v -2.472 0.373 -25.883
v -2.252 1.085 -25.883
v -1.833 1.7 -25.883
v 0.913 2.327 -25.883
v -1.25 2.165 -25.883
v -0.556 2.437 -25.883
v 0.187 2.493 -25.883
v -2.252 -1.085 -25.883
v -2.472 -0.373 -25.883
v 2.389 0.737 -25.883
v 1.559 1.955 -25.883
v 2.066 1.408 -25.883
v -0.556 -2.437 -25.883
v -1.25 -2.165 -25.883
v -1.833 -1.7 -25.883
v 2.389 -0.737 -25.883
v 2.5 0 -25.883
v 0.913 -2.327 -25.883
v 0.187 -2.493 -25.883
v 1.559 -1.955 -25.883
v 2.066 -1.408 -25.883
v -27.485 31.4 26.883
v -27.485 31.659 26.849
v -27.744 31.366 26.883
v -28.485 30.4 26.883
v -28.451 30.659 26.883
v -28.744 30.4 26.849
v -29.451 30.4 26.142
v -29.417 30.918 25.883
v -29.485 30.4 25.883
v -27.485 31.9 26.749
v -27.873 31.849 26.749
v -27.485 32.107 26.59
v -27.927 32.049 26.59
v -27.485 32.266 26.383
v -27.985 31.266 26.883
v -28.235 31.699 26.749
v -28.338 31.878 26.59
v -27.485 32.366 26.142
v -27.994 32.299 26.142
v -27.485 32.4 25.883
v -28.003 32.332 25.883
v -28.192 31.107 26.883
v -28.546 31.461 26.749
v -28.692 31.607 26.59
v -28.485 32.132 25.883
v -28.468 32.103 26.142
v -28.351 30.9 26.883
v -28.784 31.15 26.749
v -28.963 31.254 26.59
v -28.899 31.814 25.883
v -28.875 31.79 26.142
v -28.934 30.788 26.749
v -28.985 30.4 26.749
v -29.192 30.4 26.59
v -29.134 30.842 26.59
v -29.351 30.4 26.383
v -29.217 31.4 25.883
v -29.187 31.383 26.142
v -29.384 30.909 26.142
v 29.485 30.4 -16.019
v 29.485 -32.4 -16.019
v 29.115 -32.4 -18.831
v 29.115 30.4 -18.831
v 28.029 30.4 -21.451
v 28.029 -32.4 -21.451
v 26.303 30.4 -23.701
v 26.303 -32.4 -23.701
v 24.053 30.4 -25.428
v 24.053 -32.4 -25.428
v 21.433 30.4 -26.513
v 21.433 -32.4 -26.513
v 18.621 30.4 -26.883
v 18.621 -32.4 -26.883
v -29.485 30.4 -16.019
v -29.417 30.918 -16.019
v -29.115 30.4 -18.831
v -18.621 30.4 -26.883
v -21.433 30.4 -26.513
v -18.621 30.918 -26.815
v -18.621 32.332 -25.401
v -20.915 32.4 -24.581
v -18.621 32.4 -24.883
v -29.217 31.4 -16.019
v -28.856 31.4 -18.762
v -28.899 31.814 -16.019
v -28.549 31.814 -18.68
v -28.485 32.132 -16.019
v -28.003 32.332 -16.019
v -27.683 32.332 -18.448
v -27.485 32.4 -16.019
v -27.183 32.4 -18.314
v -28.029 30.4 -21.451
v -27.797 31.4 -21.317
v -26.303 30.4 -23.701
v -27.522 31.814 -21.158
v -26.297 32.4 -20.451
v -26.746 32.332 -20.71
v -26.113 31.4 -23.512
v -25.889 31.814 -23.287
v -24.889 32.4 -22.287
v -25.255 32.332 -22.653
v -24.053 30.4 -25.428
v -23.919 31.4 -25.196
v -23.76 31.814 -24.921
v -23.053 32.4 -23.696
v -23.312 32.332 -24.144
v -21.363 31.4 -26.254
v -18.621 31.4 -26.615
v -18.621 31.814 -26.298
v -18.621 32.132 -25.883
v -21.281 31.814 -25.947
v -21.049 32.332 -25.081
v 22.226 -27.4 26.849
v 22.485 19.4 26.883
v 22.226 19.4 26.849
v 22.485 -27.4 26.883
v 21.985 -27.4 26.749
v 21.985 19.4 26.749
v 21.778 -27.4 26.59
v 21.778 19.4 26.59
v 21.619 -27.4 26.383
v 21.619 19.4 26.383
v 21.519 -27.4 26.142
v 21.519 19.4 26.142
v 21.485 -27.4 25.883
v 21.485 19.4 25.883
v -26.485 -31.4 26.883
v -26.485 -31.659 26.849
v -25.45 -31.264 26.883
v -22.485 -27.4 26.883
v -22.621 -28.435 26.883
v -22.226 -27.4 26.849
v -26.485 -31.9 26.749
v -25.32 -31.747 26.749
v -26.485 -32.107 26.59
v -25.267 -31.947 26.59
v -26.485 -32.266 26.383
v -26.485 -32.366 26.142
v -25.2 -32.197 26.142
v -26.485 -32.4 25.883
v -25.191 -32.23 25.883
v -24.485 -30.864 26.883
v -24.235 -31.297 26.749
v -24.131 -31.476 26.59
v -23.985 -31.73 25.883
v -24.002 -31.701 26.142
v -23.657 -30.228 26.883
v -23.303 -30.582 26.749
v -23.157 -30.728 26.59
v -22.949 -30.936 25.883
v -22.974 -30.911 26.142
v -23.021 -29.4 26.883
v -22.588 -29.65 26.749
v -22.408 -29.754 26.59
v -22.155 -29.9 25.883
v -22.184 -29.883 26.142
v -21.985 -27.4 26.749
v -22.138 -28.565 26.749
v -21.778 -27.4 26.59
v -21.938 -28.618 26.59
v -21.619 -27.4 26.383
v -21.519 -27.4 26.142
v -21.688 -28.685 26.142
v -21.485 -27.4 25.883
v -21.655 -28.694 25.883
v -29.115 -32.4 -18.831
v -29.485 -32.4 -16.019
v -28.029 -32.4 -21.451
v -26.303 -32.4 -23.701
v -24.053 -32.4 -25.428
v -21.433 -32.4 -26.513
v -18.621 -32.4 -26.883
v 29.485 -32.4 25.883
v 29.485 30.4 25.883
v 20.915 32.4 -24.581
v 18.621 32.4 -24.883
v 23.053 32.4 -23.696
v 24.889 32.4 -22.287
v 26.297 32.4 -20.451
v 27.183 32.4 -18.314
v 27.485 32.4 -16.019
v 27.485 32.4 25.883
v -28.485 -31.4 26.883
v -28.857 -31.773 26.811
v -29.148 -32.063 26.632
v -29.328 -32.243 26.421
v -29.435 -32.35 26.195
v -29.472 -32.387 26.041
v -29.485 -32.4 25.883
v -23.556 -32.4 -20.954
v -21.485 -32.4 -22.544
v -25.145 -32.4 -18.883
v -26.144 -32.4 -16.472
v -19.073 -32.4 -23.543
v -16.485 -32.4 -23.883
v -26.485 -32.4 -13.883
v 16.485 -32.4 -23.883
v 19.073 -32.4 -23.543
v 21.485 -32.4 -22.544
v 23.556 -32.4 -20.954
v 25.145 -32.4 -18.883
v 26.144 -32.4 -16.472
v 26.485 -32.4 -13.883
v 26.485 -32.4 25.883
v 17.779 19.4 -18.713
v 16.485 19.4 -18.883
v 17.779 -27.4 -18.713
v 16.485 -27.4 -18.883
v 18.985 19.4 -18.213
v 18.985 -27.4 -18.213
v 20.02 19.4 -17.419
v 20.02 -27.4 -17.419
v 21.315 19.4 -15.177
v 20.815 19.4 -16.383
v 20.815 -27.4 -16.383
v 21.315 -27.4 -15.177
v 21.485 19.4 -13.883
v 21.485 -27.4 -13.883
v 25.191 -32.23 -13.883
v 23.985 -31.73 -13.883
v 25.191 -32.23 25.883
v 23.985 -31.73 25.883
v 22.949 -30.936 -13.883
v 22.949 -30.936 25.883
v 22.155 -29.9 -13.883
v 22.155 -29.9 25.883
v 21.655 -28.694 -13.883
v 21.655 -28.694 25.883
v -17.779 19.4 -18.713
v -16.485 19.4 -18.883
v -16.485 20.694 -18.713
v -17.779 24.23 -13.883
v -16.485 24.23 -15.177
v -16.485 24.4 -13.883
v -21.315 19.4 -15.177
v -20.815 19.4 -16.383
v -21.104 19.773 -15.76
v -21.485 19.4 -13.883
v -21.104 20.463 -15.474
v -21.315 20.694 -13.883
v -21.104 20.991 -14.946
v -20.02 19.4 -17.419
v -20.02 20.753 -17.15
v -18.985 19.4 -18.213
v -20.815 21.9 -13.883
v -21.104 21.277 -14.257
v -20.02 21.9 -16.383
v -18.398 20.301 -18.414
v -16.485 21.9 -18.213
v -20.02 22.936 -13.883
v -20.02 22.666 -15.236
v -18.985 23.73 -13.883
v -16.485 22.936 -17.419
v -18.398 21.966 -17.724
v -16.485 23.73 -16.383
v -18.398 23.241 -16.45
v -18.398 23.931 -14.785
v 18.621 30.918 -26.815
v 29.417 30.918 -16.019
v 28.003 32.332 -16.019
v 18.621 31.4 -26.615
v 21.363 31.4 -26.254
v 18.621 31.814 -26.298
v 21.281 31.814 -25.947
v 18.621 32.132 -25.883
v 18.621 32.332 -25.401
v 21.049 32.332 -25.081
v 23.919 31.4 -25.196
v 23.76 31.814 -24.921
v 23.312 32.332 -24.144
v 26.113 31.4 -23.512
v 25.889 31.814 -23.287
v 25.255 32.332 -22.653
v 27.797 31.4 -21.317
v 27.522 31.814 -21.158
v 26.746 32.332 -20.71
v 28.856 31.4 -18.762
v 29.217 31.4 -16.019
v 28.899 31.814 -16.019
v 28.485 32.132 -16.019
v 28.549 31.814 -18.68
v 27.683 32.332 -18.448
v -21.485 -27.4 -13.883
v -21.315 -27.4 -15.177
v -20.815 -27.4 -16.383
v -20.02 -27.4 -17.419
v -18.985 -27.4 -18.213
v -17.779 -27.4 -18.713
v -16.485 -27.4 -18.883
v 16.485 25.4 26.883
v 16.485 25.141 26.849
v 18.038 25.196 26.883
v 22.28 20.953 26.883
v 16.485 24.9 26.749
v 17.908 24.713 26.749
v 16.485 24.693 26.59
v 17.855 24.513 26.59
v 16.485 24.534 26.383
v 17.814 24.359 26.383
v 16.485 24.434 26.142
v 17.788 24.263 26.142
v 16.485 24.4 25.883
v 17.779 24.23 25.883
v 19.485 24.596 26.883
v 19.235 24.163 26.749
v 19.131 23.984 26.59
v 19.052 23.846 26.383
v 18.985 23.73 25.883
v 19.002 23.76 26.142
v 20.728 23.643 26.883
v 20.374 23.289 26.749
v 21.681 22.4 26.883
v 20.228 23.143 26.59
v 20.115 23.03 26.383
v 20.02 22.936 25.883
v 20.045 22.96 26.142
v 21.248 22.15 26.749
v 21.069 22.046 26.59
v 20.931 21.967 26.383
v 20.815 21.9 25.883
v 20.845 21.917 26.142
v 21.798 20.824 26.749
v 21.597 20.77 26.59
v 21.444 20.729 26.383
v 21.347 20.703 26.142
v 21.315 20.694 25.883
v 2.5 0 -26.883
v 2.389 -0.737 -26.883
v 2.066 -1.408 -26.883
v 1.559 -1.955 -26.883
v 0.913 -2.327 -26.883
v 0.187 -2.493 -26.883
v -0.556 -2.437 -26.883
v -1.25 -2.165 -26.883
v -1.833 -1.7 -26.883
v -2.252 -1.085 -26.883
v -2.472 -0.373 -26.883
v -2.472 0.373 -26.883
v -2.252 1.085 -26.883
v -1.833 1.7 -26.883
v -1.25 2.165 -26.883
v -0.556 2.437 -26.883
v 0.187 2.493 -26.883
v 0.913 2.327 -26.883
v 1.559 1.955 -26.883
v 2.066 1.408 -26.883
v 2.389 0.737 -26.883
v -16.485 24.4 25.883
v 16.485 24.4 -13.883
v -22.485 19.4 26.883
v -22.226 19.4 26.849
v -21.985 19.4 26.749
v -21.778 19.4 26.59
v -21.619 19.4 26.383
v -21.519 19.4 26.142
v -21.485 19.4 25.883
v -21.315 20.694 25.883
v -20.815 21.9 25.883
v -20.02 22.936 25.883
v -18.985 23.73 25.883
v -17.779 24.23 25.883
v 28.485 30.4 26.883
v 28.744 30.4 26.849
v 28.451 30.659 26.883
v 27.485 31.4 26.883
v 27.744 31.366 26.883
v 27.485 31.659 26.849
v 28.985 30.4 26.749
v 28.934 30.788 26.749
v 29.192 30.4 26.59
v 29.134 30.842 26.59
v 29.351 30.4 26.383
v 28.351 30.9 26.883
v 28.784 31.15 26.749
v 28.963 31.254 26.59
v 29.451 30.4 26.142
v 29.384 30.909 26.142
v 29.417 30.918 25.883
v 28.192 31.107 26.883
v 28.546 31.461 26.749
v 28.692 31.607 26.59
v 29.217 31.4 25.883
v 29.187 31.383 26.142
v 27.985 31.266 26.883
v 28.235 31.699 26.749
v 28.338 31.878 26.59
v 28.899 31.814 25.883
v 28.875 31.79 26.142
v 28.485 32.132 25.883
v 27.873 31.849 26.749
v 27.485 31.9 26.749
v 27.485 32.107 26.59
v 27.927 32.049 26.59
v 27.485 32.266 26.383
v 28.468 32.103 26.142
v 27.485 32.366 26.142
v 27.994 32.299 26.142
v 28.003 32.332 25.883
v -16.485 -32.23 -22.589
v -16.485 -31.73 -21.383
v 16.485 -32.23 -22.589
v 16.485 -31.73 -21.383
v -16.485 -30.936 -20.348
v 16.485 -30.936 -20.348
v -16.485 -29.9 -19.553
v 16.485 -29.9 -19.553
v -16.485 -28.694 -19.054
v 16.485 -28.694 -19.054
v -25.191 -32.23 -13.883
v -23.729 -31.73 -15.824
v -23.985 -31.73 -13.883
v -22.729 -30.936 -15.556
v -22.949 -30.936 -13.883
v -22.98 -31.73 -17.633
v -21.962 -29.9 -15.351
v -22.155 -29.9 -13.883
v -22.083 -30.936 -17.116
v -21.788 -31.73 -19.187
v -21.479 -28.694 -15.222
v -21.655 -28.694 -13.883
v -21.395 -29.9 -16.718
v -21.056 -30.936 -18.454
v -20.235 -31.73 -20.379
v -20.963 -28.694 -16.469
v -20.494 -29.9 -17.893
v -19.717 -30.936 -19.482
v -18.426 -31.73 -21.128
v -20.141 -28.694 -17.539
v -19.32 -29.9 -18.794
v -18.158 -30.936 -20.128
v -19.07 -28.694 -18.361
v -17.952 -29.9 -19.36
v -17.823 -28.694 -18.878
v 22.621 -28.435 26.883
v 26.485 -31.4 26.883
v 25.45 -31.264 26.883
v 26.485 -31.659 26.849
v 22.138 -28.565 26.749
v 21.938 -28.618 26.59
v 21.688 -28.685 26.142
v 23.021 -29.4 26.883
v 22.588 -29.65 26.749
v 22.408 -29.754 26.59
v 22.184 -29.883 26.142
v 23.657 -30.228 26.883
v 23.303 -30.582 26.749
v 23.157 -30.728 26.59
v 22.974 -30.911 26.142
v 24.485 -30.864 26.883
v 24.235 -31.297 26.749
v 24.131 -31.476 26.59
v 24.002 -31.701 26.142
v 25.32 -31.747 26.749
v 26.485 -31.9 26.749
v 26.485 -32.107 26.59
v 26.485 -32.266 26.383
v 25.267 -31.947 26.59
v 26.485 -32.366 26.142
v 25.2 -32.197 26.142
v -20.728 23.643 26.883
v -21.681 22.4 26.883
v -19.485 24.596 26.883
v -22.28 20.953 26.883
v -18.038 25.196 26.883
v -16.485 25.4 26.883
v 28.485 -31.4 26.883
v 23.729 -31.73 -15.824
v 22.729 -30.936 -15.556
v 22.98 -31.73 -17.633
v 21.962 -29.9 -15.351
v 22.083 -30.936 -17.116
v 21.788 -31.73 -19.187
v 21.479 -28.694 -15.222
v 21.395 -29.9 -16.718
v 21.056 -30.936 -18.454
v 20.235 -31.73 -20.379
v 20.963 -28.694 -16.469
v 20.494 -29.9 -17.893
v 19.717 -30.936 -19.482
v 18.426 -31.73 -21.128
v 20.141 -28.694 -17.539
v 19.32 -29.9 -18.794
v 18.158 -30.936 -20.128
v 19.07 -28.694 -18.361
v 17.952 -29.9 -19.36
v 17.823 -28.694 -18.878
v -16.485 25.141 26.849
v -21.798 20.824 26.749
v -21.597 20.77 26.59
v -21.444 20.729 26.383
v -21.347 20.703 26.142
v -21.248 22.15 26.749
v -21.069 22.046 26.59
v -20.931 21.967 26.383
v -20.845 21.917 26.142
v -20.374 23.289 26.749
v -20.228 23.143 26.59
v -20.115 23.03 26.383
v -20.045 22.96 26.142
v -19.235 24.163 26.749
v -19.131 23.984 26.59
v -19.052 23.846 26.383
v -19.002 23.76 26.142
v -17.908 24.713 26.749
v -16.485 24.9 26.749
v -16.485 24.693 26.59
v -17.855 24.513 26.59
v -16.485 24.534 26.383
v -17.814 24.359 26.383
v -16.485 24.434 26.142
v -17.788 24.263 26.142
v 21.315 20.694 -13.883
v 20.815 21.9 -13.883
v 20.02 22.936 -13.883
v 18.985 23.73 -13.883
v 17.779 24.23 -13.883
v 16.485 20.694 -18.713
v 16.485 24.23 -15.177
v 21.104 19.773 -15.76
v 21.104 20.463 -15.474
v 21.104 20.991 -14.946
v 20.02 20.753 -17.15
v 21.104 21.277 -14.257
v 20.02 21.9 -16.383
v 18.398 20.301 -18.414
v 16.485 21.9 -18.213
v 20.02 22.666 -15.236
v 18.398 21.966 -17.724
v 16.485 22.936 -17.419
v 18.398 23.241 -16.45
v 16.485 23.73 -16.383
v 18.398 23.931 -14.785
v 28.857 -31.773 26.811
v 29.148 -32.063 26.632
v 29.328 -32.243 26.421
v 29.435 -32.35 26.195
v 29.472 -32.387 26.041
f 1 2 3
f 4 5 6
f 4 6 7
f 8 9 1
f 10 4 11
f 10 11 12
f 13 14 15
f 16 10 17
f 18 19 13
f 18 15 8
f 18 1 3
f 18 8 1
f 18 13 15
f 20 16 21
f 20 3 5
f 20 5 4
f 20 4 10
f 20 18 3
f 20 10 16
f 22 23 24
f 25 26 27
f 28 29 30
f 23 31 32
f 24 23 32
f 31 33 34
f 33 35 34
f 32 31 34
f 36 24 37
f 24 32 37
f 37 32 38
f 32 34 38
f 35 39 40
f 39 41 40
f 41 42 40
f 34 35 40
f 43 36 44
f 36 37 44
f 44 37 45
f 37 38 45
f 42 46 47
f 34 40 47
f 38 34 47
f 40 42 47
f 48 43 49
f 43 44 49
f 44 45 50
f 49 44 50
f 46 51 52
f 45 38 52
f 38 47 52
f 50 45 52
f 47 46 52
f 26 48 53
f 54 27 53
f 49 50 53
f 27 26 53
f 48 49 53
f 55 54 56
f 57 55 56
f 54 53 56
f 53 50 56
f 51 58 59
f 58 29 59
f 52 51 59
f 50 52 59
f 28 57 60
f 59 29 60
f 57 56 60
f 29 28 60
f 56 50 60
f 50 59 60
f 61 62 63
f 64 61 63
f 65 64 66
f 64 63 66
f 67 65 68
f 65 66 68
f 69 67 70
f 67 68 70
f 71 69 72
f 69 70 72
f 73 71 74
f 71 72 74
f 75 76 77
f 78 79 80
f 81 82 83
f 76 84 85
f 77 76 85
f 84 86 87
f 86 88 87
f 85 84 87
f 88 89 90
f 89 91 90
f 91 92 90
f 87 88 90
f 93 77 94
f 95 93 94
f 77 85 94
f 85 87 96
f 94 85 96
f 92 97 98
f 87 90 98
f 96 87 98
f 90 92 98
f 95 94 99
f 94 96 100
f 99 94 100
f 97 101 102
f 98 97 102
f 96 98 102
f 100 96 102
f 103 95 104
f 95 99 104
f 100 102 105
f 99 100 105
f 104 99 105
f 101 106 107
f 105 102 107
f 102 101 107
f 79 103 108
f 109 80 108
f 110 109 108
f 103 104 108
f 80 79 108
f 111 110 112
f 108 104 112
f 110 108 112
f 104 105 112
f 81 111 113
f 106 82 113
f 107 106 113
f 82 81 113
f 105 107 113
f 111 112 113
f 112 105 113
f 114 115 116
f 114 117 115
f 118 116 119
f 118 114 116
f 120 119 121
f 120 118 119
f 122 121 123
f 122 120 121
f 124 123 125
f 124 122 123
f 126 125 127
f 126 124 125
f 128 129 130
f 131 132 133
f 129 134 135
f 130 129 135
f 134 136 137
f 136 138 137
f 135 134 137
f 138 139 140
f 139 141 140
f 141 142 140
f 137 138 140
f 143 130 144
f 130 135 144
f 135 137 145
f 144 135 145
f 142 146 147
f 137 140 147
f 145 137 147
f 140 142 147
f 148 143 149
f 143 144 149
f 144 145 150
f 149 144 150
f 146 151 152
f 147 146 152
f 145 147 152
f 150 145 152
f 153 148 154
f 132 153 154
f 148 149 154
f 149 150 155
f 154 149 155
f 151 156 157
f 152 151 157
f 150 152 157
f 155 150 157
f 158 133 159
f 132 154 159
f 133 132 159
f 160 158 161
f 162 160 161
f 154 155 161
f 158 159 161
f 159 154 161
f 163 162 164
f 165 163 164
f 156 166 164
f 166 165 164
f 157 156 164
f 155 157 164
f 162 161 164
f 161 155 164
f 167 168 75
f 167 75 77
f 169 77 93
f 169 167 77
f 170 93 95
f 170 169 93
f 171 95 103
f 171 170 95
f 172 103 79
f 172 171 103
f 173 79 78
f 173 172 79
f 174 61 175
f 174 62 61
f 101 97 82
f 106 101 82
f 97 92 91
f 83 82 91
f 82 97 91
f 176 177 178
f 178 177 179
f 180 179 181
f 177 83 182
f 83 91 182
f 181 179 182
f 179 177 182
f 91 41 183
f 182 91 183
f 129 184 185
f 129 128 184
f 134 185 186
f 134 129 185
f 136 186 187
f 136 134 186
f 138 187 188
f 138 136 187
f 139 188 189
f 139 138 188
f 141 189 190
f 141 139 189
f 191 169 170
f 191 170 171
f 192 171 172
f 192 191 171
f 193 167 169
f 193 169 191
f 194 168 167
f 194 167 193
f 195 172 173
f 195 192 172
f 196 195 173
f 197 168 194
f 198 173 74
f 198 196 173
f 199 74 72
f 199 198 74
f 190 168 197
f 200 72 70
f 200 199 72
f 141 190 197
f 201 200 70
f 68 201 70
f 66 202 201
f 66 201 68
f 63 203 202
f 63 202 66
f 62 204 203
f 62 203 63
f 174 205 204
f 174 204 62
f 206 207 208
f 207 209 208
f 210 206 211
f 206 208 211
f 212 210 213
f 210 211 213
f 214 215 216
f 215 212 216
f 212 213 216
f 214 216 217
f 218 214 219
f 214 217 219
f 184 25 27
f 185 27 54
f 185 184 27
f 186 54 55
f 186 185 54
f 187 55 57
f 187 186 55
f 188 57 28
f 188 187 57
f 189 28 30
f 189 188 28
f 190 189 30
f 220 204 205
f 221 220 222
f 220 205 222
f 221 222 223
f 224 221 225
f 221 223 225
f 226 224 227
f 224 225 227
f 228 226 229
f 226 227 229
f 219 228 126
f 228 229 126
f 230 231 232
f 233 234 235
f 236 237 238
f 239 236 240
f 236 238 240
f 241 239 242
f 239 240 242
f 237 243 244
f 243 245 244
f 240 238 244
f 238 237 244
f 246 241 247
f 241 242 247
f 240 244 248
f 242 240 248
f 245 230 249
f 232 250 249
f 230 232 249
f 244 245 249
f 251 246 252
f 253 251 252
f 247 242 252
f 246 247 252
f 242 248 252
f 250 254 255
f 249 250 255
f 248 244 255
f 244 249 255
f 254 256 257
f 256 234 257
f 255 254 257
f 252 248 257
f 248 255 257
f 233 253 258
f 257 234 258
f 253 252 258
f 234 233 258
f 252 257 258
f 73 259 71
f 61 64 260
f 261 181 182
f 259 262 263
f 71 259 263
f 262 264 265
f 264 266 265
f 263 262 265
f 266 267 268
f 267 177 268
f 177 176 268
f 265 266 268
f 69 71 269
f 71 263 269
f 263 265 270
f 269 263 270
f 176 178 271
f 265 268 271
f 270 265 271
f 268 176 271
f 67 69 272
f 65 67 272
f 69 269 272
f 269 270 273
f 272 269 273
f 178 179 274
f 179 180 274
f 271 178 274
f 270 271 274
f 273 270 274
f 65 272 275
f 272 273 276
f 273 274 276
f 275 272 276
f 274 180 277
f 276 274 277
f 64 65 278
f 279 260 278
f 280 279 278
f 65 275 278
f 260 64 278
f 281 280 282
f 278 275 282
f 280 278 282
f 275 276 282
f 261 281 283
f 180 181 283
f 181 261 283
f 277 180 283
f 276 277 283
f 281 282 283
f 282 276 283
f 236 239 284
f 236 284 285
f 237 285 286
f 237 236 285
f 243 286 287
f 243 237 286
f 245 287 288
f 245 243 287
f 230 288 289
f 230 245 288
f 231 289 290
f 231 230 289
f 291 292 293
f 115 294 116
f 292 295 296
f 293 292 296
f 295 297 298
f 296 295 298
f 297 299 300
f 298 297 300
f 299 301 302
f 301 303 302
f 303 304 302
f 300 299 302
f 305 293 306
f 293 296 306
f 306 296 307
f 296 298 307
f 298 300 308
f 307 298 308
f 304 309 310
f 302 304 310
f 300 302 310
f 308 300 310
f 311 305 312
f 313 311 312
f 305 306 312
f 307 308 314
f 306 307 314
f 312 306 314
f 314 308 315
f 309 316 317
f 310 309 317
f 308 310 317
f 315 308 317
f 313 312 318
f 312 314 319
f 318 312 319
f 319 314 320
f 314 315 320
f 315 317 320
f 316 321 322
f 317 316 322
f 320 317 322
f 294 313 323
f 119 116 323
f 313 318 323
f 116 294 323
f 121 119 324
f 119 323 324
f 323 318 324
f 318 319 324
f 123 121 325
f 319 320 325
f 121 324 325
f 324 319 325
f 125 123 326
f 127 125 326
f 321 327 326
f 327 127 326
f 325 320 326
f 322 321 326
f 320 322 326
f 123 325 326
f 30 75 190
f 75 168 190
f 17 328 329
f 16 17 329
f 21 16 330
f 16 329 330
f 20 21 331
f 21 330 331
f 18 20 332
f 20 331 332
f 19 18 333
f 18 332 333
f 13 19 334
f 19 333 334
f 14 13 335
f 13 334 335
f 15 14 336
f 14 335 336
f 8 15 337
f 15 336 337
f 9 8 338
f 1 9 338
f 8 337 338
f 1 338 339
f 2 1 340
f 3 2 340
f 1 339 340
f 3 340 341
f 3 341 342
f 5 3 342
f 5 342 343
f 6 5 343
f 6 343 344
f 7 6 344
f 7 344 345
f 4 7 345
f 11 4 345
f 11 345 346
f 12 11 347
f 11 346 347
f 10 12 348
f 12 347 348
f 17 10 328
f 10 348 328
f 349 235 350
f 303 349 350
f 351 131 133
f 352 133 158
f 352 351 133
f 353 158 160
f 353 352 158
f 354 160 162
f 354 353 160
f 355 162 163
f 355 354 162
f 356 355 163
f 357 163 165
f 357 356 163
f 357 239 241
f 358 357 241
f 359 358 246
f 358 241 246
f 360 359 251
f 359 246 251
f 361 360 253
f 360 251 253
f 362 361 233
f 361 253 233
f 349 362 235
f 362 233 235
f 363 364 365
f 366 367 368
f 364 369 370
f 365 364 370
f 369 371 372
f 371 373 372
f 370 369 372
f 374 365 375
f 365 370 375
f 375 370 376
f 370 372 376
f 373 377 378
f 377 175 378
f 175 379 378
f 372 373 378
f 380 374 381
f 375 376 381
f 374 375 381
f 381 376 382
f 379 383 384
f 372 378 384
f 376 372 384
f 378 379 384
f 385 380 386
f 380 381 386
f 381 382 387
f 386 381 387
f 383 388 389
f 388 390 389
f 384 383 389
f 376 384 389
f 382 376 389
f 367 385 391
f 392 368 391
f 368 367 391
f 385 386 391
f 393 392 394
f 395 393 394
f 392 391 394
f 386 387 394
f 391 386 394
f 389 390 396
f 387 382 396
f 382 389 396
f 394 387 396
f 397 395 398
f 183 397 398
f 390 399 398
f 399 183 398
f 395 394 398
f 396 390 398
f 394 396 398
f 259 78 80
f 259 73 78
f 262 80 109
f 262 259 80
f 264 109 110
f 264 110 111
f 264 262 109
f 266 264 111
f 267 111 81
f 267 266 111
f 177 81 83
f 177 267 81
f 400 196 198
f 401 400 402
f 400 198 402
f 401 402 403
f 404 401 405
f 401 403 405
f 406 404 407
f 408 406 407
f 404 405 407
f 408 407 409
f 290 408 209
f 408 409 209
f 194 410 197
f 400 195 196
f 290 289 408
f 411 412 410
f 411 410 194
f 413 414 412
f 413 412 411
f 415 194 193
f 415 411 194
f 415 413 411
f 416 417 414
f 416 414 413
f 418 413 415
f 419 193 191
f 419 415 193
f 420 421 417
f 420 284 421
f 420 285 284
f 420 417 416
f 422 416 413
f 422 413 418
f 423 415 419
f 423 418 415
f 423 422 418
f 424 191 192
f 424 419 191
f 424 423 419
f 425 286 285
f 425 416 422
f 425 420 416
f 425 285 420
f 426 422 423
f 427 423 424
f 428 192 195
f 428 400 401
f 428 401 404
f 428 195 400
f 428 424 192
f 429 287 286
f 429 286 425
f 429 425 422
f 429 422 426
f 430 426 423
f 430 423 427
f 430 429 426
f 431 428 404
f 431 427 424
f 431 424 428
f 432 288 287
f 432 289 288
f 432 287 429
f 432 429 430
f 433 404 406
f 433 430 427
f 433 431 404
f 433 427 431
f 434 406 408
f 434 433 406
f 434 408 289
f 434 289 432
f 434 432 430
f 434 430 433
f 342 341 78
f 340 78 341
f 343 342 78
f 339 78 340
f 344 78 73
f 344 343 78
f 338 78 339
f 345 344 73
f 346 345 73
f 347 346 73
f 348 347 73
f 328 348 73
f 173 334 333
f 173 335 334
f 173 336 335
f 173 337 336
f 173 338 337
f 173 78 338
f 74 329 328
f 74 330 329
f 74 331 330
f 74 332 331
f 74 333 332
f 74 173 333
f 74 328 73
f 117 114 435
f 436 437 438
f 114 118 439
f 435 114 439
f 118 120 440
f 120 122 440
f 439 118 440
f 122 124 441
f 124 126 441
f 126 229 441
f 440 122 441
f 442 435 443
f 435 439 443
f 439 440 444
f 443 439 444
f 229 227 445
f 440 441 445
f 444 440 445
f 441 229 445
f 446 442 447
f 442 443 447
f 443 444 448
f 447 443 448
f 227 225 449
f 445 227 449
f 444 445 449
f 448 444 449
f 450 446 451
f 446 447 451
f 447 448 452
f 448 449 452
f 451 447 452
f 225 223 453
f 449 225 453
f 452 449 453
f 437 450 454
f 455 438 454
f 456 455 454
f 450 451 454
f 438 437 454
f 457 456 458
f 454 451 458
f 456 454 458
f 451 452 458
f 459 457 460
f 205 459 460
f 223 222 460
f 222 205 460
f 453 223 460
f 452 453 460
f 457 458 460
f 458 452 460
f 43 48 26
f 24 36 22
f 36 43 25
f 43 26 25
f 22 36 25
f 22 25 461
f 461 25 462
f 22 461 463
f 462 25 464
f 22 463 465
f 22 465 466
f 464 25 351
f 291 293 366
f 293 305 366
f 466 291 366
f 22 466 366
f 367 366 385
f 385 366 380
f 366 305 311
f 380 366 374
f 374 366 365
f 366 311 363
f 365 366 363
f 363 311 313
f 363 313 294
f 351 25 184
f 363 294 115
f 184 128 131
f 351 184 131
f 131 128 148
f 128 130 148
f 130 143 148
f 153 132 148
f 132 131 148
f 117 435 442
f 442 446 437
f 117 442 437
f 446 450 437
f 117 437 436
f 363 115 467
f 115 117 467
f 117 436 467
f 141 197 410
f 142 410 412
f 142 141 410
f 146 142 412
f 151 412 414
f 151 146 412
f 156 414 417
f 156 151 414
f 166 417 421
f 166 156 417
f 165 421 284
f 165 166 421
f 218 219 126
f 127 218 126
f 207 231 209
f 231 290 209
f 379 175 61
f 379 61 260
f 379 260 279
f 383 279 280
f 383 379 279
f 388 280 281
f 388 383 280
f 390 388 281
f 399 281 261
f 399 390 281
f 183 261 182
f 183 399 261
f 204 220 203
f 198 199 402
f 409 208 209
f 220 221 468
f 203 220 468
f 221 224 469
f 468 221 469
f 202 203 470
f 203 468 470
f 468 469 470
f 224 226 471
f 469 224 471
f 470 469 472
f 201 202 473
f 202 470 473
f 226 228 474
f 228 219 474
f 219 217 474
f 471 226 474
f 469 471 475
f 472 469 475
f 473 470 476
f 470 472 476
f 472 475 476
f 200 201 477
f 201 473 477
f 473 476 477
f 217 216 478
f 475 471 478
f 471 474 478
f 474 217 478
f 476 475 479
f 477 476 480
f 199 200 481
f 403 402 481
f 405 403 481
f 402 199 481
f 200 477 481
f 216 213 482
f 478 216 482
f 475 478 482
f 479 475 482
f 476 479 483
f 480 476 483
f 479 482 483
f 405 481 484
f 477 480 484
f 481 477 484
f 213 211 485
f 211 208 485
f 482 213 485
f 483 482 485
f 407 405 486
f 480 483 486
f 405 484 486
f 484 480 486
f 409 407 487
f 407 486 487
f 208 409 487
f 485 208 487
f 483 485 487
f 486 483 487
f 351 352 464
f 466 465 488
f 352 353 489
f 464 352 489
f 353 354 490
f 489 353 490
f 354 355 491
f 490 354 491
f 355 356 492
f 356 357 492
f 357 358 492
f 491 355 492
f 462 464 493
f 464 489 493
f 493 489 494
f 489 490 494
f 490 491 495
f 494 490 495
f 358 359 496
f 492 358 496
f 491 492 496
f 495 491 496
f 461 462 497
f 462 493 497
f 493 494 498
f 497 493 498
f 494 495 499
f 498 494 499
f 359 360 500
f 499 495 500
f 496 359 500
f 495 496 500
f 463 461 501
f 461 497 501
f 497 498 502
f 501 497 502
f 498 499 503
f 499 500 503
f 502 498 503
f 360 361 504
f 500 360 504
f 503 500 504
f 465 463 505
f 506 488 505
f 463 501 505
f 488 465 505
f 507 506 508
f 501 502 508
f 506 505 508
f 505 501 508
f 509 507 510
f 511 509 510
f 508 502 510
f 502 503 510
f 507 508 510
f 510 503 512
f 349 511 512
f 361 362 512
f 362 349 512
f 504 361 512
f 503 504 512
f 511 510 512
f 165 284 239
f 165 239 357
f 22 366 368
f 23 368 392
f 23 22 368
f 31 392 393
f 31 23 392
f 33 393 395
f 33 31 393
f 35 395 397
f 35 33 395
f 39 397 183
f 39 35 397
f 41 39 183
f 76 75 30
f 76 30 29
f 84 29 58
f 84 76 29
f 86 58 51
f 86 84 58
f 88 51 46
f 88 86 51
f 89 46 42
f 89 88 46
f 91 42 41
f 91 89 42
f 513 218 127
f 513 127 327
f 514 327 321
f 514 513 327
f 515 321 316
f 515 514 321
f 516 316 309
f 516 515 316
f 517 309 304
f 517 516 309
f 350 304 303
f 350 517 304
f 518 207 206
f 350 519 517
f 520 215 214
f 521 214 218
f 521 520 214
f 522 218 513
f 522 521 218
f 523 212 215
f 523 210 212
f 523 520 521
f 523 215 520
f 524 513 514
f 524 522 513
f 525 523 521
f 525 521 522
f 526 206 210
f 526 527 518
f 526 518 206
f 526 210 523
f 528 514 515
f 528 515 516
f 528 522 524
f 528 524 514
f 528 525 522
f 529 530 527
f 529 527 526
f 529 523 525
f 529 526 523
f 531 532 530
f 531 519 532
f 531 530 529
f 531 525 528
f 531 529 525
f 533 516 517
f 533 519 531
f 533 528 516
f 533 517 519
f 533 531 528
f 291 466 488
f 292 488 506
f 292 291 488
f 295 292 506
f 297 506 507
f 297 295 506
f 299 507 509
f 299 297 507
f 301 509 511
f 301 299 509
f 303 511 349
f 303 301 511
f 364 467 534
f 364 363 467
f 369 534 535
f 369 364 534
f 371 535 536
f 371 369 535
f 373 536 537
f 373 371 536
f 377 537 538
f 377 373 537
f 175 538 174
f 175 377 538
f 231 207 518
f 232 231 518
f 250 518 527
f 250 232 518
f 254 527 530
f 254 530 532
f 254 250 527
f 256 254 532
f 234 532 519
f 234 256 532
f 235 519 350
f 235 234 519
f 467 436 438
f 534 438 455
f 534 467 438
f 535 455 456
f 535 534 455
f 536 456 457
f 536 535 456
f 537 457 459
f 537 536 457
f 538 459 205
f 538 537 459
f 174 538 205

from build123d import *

# Parameters (mm, degrees)
F0_W     = 58.9698813856
F0_H     = 53.7666678429
F1_DEPTH = 32.4
F2_T     = -8
F3_R     = 5
F4_R     = 10.8639610307
F5_R     = 2
F6_R     = 1
F7_R     = 2.5
F8_DEPTH = 1


with BuildPart() as f1:
    # F0 (on Front) → F1 (new body, symmetric)
    with BuildSketch(Plane.XZ):
        Rectangle(F0_W, F0_H)
    extrude(amount=F1_DEPTH, both=True)

    # F2
    f2_openings = [f1.faces().sort_by_distance(p)[0] for p in [
        (0, 0, 26.883334),
        (0, -32.4, 0),
    ]]
    offset(amount=F2_T, openings=f2_openings)

    # F3
    f3_edges = [f1.edges().sort_by_distance(p)[0] for p in [
        (0, 24.4, -18.883334),
        (0, -32.4, -18.883334),
        (-21.484941, -4, -18.883334),
        (21.484941, -4, -18.883334),
        (-21.484941, 24.4, 4),
        (21.484941, 24.4, 4),
        (21.484941, -32.4, 4),
        (-21.484941, -32.4, 4),
    ]]
    fillet(f3_edges, radius=F3_R)

    # F4
    f4_edges = [f1.edges().sort_by_distance(p)[0] for p in [
        (29.484941, 0, -26.883334),
        (-29.484941, 0, -26.883334),
    ]]
    fillet(f4_edges, radius=F4_R)

    # F5
    f5_edges = [f1.edges().sort_by_distance(p)[0] for p in [
        (0, 32.4, -26.883334),
        (29.484941, 32.4, 5.431981),
        (26.30296, 32.4, -23.701353),
        (-26.30296, 32.4, -23.701353),
        (-29.484941, 32.4, 5.431981),
    ]]
    fillet(f5_edges, radius=F5_R)

    # F6
    f6_edges = [f1.edges().sort_by_distance(p)[0] for p in [
        (0, 24.4, 26.883334),
        (29.484941, -1, 26.883334),
        (28.899154, 31.814214, 26.883334),
        (27.984941, -32.4, 26.883334),
        (-27.984941, -32.4, 26.883334),
        (0, 32.4, 26.883334),
        (22.949407, -30.935534, 26.883334),
        (-28.899154, 31.814214, 26.883334),
        (21.484941, -4, 26.883334),
        (-29.484941, -1, 26.883334),
        (20.020475, 22.935534, 26.883334),
        (-22.949407, -30.935534, 26.883334),
        (-20.020475, 22.935534, 26.883334),
        (-21.484941, -4, 26.883334),
    ]]
    fillet(f6_edges, radius=F6_R)

    # F7 (on face) → F8 (cut)
    with BuildSketch(Plane(origin=(0, 0, -26.8833339214), x_dir=(1, 0, 0), z_dir=(0, 0, -1))):
        Circle(F7_R)
    extrude(amount=-F8_DEPTH, mode=Mode.SUBTRACT)


solid = f1.part
